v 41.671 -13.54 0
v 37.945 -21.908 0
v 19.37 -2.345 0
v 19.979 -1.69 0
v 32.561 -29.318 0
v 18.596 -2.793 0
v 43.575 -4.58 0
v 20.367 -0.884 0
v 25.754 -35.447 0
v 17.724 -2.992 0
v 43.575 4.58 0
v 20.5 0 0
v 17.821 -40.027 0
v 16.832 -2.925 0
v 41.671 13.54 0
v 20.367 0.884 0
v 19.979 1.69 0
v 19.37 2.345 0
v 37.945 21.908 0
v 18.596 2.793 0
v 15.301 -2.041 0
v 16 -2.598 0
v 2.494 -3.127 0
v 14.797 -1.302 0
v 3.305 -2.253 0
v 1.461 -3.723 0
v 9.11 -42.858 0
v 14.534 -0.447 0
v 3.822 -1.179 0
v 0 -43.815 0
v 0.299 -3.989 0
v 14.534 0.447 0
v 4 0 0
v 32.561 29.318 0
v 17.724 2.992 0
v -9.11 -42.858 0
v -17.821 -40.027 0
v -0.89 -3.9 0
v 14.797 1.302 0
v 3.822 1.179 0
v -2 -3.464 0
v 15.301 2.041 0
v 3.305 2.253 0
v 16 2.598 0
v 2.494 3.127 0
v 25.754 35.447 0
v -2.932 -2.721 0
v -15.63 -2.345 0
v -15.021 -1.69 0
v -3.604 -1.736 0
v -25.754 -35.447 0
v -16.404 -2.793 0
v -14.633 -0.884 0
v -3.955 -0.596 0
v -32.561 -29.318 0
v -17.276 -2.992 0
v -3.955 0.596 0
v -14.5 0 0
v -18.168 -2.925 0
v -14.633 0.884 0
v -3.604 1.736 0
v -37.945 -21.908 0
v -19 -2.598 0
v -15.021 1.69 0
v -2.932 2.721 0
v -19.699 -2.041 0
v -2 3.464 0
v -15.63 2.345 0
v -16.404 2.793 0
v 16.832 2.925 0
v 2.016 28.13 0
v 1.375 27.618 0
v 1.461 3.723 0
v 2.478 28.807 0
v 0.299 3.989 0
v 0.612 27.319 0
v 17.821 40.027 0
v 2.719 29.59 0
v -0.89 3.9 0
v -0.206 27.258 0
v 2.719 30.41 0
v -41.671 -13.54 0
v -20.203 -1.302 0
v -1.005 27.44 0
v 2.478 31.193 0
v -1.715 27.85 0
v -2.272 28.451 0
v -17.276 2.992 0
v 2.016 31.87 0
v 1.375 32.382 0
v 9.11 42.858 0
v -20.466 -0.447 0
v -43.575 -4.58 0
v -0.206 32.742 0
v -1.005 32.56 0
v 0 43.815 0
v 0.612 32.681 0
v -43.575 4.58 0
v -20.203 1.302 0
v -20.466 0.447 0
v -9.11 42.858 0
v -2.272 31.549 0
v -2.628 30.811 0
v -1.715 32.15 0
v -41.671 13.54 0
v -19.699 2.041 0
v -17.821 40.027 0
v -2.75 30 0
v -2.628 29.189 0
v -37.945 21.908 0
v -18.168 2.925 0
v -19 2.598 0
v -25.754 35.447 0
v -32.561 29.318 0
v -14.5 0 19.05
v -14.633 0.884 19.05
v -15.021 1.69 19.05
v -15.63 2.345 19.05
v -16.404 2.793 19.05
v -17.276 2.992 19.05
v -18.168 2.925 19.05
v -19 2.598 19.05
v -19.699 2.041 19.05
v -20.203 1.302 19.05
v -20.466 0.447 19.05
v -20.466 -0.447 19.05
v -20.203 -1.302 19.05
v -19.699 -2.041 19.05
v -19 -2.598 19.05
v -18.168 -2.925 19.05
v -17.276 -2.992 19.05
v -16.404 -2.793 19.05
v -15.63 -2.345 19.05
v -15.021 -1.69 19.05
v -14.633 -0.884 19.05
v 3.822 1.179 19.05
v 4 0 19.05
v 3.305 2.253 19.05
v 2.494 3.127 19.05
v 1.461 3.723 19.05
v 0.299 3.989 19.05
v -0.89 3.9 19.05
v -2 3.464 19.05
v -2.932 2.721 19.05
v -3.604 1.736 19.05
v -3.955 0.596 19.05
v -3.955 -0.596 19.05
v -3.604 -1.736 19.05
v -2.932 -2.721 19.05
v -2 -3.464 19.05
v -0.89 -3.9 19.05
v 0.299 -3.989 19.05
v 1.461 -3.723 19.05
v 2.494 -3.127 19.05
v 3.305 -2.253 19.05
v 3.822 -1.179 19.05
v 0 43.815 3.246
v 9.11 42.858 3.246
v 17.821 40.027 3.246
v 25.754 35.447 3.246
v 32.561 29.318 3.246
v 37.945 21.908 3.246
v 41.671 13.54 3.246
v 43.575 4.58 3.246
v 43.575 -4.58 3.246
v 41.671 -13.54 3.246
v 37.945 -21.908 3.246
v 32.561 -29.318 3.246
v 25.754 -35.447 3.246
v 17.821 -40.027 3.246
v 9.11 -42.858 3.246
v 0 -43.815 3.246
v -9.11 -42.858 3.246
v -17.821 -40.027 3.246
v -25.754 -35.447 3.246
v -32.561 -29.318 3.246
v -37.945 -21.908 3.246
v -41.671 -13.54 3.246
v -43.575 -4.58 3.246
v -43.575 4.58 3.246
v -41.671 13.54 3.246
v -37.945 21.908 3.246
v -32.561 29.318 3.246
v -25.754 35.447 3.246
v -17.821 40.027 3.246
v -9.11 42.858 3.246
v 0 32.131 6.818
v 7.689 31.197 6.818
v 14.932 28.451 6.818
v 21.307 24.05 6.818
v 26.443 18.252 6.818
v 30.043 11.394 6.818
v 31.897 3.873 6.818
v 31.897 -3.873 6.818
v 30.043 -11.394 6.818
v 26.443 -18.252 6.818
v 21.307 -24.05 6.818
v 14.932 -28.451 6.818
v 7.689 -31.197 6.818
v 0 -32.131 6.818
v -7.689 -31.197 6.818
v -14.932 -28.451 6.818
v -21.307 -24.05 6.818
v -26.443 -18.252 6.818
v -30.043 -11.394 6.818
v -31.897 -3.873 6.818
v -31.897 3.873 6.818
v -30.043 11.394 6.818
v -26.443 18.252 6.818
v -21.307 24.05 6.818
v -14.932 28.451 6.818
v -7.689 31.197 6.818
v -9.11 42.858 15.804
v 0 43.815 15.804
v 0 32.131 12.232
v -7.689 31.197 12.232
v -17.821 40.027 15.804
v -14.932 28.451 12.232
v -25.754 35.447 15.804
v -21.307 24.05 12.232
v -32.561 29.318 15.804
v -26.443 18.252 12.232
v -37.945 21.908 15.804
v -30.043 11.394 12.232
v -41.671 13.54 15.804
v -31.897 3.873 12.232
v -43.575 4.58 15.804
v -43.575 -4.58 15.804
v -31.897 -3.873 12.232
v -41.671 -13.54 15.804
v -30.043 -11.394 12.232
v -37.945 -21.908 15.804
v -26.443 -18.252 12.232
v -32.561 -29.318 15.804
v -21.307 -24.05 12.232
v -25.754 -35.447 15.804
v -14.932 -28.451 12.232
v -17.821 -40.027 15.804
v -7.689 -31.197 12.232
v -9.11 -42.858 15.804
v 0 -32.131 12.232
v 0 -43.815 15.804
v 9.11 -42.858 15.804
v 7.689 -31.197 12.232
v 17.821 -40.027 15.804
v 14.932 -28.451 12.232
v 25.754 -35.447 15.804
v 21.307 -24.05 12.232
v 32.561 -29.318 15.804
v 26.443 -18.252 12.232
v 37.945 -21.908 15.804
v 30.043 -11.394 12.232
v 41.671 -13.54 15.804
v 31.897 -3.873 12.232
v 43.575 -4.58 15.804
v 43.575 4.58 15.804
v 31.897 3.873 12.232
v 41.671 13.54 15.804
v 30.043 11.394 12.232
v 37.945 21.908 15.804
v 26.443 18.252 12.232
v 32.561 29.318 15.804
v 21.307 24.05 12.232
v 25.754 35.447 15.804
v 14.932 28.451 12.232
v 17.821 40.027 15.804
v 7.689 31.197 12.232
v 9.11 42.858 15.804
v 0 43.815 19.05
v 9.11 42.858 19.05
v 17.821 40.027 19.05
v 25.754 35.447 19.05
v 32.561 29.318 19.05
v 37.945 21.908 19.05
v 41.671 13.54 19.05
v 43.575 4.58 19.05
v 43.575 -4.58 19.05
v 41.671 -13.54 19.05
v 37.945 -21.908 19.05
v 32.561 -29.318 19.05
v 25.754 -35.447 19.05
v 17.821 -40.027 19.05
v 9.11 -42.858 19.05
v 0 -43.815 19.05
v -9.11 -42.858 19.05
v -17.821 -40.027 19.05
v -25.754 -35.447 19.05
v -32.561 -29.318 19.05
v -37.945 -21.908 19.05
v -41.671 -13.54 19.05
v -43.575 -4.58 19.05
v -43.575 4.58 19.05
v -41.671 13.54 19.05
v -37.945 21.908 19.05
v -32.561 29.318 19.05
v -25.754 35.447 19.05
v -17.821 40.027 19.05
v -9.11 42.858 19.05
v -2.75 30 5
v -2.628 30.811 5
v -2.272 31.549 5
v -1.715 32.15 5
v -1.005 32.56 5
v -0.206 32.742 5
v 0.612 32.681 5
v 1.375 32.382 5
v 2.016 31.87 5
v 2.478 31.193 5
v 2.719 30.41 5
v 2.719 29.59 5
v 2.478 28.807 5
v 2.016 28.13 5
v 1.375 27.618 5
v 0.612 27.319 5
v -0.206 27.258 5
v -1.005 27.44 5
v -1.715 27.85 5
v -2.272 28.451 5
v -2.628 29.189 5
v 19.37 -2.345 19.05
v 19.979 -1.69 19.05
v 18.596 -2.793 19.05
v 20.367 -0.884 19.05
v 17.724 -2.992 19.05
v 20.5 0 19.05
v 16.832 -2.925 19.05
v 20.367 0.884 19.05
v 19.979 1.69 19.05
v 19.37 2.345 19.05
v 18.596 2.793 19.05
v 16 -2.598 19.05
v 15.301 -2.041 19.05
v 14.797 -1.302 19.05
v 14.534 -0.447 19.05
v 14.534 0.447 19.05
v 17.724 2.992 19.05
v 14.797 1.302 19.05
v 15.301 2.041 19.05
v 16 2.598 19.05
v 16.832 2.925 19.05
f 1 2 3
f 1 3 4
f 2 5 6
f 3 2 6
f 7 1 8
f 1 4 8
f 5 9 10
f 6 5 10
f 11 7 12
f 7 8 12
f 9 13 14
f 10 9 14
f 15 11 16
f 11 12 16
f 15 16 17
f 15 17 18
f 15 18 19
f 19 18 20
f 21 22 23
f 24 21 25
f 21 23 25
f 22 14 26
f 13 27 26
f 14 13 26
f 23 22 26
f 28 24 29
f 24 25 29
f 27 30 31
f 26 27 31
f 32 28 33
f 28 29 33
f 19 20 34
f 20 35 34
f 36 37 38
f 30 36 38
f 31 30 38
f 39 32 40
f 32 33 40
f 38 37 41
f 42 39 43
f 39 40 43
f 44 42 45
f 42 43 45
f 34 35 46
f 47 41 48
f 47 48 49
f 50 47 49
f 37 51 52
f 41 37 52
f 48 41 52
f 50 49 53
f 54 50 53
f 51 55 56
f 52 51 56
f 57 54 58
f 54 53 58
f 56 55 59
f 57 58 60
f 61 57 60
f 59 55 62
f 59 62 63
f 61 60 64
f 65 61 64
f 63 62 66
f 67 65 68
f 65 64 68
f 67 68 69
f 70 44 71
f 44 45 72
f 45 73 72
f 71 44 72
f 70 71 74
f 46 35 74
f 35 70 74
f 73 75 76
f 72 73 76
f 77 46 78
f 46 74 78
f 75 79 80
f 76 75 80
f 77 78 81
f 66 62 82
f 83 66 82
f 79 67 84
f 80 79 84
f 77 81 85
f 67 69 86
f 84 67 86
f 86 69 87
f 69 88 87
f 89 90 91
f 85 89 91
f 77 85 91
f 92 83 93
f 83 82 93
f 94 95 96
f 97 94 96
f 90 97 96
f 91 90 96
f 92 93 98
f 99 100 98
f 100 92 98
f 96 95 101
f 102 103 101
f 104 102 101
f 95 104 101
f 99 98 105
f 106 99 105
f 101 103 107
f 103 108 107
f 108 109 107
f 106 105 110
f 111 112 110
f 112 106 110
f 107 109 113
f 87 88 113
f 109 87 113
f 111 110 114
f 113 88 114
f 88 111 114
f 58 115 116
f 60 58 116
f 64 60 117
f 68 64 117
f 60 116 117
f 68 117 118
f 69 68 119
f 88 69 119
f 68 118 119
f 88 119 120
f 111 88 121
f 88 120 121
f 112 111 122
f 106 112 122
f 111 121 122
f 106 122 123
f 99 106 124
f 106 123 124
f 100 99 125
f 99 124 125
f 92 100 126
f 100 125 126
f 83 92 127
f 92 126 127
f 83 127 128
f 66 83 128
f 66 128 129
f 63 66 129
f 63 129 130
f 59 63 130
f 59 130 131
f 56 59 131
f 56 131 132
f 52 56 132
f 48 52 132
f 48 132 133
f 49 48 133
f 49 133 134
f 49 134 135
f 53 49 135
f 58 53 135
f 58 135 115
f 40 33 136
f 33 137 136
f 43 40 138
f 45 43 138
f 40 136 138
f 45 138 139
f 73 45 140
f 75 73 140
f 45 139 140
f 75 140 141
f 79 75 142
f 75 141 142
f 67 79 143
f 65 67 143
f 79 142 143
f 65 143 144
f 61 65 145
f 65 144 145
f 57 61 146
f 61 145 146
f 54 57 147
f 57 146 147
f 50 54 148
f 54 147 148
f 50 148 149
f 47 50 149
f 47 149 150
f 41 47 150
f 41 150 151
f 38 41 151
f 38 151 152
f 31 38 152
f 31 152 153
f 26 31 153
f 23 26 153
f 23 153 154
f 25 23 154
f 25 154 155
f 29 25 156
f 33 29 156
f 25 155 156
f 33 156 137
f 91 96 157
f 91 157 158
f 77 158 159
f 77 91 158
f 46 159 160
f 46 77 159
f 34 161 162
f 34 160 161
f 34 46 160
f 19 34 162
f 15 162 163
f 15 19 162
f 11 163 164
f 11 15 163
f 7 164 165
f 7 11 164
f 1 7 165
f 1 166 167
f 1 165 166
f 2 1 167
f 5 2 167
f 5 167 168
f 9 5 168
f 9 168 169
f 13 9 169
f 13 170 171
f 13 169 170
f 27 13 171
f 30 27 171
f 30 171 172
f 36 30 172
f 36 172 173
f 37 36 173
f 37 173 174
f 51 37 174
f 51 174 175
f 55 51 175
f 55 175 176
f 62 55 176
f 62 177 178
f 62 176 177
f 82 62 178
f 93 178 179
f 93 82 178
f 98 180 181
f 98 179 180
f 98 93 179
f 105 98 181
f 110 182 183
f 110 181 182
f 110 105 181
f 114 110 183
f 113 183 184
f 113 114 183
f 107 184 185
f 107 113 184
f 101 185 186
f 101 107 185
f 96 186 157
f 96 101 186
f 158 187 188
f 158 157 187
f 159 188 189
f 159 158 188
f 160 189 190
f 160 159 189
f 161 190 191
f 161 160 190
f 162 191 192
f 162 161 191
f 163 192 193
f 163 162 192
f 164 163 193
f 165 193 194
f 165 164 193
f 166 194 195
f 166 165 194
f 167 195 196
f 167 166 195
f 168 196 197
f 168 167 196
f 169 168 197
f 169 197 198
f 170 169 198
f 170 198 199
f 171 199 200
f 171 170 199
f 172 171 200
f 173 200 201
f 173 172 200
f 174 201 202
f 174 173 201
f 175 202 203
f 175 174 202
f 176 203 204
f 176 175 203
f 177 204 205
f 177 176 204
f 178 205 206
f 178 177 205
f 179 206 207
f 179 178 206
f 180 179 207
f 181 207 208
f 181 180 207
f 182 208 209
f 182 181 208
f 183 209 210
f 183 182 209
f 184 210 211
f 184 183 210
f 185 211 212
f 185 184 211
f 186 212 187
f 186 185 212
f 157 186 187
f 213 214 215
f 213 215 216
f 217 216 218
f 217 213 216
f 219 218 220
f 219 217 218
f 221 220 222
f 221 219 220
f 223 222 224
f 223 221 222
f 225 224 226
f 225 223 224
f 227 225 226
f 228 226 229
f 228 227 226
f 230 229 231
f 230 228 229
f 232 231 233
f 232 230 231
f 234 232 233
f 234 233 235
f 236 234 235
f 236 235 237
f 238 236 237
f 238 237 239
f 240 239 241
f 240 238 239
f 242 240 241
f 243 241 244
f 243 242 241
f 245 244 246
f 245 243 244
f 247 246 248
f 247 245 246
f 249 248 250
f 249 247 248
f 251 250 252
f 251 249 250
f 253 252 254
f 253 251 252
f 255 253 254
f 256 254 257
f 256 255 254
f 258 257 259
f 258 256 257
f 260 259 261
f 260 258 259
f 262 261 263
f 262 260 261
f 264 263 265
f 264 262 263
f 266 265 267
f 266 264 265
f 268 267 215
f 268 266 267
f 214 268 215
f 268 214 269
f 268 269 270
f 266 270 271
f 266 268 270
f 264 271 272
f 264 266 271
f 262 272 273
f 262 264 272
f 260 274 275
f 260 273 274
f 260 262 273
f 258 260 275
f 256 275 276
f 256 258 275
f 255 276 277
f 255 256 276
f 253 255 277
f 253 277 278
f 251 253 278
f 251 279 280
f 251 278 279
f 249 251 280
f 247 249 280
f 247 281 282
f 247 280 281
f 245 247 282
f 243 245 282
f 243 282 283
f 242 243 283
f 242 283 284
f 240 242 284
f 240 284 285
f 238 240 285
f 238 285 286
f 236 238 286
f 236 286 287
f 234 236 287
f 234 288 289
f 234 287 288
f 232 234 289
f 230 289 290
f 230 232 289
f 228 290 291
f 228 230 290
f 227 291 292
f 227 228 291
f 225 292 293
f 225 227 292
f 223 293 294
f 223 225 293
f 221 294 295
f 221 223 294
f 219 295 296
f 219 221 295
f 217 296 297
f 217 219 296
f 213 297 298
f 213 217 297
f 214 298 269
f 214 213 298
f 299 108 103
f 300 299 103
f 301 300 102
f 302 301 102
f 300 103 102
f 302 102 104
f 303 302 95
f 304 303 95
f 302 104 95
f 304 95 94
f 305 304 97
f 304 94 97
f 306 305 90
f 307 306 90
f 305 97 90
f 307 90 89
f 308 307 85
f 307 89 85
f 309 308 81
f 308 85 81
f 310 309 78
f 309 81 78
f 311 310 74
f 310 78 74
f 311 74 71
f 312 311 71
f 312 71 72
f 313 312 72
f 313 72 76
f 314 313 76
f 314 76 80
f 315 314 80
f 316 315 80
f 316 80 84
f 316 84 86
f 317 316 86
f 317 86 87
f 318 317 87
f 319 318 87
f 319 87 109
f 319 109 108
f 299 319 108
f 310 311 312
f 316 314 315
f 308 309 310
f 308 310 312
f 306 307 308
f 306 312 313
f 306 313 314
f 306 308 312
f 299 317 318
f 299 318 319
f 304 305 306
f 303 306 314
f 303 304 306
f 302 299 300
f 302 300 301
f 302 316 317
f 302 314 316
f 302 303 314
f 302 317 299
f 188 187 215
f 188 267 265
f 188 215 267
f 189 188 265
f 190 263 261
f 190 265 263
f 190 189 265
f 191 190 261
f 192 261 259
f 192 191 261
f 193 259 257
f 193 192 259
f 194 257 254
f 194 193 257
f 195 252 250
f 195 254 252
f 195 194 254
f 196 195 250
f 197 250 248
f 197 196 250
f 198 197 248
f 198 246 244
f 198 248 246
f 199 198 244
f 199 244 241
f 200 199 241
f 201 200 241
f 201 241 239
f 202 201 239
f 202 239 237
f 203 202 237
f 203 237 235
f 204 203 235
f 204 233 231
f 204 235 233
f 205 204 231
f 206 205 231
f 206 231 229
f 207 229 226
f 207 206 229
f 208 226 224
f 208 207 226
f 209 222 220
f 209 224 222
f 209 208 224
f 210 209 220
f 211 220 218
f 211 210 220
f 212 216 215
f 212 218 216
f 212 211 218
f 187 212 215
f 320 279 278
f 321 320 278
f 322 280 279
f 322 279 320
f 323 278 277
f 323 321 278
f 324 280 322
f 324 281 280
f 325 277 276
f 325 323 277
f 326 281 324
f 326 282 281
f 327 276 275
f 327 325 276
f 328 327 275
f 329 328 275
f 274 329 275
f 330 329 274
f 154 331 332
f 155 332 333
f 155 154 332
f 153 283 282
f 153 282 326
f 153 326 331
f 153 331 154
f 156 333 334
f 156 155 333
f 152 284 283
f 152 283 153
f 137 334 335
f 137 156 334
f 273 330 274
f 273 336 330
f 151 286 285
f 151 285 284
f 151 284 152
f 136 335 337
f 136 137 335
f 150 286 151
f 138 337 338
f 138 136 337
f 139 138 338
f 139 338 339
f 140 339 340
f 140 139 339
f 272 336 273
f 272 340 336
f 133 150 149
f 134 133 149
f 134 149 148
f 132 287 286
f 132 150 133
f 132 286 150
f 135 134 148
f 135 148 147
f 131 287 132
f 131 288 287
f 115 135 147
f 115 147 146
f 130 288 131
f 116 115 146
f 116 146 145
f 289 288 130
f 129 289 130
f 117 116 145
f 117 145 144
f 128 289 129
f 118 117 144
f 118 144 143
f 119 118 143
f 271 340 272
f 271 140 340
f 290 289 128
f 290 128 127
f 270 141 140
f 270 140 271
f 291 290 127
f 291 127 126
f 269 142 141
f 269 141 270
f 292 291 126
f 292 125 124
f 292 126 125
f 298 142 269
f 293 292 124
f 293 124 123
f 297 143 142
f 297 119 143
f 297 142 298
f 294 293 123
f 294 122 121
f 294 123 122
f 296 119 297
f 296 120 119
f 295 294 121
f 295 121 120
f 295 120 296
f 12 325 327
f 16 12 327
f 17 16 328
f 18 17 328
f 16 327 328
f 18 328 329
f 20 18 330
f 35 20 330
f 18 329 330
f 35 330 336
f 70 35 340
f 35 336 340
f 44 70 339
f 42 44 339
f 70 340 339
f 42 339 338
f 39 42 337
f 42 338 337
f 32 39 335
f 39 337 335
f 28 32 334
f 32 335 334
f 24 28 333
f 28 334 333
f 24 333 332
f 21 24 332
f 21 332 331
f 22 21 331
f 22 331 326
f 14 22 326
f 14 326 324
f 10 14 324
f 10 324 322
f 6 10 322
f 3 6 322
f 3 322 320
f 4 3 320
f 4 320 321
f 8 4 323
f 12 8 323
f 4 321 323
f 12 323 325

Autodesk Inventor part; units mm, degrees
ref_plane "YZ Plane" through (0, 0, 0) normal (1, 0, 0) x (0, 1, 0)
ref_plane "XZ Plane" through (0, 0, 0) normal (0, 1, 0) x (-1, 0, 0)
sketch "Main Sketch" plane through (0, 0, 0) normal (1, 0, 0) x (0, 1, 0)
  line L0 (0, 19.05) -> (43.815, 19.05)
  line L1 (43.815, 19.05) -> (43.815, 15.8043)
  line L2 (43.815, 15.8043) -> (32.131, 12.2321)
  line L3 (32.131, 12.2321) -> (32.131, 6.8179)
  line L4 (32.131, 6.8179) -> (43.815, 3.2457)
  line L5 (43.815, 3.2457) -> (43.815, 0)
  line L6 (43.815, 0) -> (0, 0)
  line L7 (40.64, 14.8336) -> (40.64, 4.2164) construction
  line L8 (32.131, 9.525) -> (40.64, 9.525) construction
  line L9 (43.815, 15.8043) -> (43.815, 3.2457)
  line L10 (0, -4) -> (0, 24) projected
  line L11 (0, 0) -> (0, 19.05)
  dimension "d0" = 10.6172
  dimension "d1" = 34
  dimension "d2" = 3.175
  dimension "d6" = 19.05
  dimension "d21" = 81.28
  dimension "d25" = 11.684
  dimension "d27" = 9.525
ref_plane "Belt Plane" through (0, 32.131, 9.525) normal (0, 0, 1) x (1, 0, 0)
revolve "Body" add sketch "Main Sketch" angle 360 about axis through (0, 0, -10) along (0, 0, 1)
revolve "Groove" cut sketch "Main Sketch" angle 360 about axis through (0, 0, -10) along (0, 0, 1) contours L9 L4 L3 L2
fillet "Fillet External" [suppressed]
fillet "Fillet Internal" [suppressed]
pattern_of_one "Groove Pattern"
sketch "Sketch2" plane through (0, 0, 0) normal (0, 0, -1) x (-1, 0, 0)
  circle A0 centre (0, 0) radius 43.815 projected
  line L0 (0, 0) -> (0, 30) construction
  circle A1 centre (0, 30) radius 2.75
  dimension "d28" = 5.5
  dimension "d29" = 30
extrude "Extrusion1" cut sketch "Sketch2" against normal blind 5 contours A1
sketch "Sketch3" plane through (0, 0, 19.05) normal (0, 0, 1) x (1, 0, 0)
  circle A0 centre (0, 0) radius 43.815 projected
  circle A1 centre (0, 0) radius 4
  line L0 (-17.5, 0) -> (17.5, 0) construction
  circle A2 centre (-17.5, 0) radius 3
  circle A3 centre (17.5, 0) radius 3
  dimension "d32" = 8
  dimension "d33" = 35
  dimension "d34" = 6
extrude "Extrusion2" cut sketch "Sketch3" against normal through all contours A1 | A2 | A3
equation "\"d0\" = da_Bw"
equation "\"d1\" = da_Alfa"
equation "\"d2\" = da_c"
equation "\"d21\" = da_Dw"
equation "\"d25\" = da_Hd"
equation "\"d27\" = da_Se"
equation "\"da_r1\" = 0"
equation "\"da_r2\" = 0"
equation "\"d18\" = da_Sg"
equation "\"d5\" = da_Se"
equation "\"da_Bw\" = 10.6172"
equation "\"da_Alfa\" = 34deg"
equation "\"da_c\" = 3.175"
equation "\"da_Dw\" = 81.28"
equation "\"da_Hd\" = 11.684"
equation "\"da_Se\" = 9.525"
equation "\"da_Sg\" = 15.875"
properties part number "Grooved Pulley1" material "Steel"
